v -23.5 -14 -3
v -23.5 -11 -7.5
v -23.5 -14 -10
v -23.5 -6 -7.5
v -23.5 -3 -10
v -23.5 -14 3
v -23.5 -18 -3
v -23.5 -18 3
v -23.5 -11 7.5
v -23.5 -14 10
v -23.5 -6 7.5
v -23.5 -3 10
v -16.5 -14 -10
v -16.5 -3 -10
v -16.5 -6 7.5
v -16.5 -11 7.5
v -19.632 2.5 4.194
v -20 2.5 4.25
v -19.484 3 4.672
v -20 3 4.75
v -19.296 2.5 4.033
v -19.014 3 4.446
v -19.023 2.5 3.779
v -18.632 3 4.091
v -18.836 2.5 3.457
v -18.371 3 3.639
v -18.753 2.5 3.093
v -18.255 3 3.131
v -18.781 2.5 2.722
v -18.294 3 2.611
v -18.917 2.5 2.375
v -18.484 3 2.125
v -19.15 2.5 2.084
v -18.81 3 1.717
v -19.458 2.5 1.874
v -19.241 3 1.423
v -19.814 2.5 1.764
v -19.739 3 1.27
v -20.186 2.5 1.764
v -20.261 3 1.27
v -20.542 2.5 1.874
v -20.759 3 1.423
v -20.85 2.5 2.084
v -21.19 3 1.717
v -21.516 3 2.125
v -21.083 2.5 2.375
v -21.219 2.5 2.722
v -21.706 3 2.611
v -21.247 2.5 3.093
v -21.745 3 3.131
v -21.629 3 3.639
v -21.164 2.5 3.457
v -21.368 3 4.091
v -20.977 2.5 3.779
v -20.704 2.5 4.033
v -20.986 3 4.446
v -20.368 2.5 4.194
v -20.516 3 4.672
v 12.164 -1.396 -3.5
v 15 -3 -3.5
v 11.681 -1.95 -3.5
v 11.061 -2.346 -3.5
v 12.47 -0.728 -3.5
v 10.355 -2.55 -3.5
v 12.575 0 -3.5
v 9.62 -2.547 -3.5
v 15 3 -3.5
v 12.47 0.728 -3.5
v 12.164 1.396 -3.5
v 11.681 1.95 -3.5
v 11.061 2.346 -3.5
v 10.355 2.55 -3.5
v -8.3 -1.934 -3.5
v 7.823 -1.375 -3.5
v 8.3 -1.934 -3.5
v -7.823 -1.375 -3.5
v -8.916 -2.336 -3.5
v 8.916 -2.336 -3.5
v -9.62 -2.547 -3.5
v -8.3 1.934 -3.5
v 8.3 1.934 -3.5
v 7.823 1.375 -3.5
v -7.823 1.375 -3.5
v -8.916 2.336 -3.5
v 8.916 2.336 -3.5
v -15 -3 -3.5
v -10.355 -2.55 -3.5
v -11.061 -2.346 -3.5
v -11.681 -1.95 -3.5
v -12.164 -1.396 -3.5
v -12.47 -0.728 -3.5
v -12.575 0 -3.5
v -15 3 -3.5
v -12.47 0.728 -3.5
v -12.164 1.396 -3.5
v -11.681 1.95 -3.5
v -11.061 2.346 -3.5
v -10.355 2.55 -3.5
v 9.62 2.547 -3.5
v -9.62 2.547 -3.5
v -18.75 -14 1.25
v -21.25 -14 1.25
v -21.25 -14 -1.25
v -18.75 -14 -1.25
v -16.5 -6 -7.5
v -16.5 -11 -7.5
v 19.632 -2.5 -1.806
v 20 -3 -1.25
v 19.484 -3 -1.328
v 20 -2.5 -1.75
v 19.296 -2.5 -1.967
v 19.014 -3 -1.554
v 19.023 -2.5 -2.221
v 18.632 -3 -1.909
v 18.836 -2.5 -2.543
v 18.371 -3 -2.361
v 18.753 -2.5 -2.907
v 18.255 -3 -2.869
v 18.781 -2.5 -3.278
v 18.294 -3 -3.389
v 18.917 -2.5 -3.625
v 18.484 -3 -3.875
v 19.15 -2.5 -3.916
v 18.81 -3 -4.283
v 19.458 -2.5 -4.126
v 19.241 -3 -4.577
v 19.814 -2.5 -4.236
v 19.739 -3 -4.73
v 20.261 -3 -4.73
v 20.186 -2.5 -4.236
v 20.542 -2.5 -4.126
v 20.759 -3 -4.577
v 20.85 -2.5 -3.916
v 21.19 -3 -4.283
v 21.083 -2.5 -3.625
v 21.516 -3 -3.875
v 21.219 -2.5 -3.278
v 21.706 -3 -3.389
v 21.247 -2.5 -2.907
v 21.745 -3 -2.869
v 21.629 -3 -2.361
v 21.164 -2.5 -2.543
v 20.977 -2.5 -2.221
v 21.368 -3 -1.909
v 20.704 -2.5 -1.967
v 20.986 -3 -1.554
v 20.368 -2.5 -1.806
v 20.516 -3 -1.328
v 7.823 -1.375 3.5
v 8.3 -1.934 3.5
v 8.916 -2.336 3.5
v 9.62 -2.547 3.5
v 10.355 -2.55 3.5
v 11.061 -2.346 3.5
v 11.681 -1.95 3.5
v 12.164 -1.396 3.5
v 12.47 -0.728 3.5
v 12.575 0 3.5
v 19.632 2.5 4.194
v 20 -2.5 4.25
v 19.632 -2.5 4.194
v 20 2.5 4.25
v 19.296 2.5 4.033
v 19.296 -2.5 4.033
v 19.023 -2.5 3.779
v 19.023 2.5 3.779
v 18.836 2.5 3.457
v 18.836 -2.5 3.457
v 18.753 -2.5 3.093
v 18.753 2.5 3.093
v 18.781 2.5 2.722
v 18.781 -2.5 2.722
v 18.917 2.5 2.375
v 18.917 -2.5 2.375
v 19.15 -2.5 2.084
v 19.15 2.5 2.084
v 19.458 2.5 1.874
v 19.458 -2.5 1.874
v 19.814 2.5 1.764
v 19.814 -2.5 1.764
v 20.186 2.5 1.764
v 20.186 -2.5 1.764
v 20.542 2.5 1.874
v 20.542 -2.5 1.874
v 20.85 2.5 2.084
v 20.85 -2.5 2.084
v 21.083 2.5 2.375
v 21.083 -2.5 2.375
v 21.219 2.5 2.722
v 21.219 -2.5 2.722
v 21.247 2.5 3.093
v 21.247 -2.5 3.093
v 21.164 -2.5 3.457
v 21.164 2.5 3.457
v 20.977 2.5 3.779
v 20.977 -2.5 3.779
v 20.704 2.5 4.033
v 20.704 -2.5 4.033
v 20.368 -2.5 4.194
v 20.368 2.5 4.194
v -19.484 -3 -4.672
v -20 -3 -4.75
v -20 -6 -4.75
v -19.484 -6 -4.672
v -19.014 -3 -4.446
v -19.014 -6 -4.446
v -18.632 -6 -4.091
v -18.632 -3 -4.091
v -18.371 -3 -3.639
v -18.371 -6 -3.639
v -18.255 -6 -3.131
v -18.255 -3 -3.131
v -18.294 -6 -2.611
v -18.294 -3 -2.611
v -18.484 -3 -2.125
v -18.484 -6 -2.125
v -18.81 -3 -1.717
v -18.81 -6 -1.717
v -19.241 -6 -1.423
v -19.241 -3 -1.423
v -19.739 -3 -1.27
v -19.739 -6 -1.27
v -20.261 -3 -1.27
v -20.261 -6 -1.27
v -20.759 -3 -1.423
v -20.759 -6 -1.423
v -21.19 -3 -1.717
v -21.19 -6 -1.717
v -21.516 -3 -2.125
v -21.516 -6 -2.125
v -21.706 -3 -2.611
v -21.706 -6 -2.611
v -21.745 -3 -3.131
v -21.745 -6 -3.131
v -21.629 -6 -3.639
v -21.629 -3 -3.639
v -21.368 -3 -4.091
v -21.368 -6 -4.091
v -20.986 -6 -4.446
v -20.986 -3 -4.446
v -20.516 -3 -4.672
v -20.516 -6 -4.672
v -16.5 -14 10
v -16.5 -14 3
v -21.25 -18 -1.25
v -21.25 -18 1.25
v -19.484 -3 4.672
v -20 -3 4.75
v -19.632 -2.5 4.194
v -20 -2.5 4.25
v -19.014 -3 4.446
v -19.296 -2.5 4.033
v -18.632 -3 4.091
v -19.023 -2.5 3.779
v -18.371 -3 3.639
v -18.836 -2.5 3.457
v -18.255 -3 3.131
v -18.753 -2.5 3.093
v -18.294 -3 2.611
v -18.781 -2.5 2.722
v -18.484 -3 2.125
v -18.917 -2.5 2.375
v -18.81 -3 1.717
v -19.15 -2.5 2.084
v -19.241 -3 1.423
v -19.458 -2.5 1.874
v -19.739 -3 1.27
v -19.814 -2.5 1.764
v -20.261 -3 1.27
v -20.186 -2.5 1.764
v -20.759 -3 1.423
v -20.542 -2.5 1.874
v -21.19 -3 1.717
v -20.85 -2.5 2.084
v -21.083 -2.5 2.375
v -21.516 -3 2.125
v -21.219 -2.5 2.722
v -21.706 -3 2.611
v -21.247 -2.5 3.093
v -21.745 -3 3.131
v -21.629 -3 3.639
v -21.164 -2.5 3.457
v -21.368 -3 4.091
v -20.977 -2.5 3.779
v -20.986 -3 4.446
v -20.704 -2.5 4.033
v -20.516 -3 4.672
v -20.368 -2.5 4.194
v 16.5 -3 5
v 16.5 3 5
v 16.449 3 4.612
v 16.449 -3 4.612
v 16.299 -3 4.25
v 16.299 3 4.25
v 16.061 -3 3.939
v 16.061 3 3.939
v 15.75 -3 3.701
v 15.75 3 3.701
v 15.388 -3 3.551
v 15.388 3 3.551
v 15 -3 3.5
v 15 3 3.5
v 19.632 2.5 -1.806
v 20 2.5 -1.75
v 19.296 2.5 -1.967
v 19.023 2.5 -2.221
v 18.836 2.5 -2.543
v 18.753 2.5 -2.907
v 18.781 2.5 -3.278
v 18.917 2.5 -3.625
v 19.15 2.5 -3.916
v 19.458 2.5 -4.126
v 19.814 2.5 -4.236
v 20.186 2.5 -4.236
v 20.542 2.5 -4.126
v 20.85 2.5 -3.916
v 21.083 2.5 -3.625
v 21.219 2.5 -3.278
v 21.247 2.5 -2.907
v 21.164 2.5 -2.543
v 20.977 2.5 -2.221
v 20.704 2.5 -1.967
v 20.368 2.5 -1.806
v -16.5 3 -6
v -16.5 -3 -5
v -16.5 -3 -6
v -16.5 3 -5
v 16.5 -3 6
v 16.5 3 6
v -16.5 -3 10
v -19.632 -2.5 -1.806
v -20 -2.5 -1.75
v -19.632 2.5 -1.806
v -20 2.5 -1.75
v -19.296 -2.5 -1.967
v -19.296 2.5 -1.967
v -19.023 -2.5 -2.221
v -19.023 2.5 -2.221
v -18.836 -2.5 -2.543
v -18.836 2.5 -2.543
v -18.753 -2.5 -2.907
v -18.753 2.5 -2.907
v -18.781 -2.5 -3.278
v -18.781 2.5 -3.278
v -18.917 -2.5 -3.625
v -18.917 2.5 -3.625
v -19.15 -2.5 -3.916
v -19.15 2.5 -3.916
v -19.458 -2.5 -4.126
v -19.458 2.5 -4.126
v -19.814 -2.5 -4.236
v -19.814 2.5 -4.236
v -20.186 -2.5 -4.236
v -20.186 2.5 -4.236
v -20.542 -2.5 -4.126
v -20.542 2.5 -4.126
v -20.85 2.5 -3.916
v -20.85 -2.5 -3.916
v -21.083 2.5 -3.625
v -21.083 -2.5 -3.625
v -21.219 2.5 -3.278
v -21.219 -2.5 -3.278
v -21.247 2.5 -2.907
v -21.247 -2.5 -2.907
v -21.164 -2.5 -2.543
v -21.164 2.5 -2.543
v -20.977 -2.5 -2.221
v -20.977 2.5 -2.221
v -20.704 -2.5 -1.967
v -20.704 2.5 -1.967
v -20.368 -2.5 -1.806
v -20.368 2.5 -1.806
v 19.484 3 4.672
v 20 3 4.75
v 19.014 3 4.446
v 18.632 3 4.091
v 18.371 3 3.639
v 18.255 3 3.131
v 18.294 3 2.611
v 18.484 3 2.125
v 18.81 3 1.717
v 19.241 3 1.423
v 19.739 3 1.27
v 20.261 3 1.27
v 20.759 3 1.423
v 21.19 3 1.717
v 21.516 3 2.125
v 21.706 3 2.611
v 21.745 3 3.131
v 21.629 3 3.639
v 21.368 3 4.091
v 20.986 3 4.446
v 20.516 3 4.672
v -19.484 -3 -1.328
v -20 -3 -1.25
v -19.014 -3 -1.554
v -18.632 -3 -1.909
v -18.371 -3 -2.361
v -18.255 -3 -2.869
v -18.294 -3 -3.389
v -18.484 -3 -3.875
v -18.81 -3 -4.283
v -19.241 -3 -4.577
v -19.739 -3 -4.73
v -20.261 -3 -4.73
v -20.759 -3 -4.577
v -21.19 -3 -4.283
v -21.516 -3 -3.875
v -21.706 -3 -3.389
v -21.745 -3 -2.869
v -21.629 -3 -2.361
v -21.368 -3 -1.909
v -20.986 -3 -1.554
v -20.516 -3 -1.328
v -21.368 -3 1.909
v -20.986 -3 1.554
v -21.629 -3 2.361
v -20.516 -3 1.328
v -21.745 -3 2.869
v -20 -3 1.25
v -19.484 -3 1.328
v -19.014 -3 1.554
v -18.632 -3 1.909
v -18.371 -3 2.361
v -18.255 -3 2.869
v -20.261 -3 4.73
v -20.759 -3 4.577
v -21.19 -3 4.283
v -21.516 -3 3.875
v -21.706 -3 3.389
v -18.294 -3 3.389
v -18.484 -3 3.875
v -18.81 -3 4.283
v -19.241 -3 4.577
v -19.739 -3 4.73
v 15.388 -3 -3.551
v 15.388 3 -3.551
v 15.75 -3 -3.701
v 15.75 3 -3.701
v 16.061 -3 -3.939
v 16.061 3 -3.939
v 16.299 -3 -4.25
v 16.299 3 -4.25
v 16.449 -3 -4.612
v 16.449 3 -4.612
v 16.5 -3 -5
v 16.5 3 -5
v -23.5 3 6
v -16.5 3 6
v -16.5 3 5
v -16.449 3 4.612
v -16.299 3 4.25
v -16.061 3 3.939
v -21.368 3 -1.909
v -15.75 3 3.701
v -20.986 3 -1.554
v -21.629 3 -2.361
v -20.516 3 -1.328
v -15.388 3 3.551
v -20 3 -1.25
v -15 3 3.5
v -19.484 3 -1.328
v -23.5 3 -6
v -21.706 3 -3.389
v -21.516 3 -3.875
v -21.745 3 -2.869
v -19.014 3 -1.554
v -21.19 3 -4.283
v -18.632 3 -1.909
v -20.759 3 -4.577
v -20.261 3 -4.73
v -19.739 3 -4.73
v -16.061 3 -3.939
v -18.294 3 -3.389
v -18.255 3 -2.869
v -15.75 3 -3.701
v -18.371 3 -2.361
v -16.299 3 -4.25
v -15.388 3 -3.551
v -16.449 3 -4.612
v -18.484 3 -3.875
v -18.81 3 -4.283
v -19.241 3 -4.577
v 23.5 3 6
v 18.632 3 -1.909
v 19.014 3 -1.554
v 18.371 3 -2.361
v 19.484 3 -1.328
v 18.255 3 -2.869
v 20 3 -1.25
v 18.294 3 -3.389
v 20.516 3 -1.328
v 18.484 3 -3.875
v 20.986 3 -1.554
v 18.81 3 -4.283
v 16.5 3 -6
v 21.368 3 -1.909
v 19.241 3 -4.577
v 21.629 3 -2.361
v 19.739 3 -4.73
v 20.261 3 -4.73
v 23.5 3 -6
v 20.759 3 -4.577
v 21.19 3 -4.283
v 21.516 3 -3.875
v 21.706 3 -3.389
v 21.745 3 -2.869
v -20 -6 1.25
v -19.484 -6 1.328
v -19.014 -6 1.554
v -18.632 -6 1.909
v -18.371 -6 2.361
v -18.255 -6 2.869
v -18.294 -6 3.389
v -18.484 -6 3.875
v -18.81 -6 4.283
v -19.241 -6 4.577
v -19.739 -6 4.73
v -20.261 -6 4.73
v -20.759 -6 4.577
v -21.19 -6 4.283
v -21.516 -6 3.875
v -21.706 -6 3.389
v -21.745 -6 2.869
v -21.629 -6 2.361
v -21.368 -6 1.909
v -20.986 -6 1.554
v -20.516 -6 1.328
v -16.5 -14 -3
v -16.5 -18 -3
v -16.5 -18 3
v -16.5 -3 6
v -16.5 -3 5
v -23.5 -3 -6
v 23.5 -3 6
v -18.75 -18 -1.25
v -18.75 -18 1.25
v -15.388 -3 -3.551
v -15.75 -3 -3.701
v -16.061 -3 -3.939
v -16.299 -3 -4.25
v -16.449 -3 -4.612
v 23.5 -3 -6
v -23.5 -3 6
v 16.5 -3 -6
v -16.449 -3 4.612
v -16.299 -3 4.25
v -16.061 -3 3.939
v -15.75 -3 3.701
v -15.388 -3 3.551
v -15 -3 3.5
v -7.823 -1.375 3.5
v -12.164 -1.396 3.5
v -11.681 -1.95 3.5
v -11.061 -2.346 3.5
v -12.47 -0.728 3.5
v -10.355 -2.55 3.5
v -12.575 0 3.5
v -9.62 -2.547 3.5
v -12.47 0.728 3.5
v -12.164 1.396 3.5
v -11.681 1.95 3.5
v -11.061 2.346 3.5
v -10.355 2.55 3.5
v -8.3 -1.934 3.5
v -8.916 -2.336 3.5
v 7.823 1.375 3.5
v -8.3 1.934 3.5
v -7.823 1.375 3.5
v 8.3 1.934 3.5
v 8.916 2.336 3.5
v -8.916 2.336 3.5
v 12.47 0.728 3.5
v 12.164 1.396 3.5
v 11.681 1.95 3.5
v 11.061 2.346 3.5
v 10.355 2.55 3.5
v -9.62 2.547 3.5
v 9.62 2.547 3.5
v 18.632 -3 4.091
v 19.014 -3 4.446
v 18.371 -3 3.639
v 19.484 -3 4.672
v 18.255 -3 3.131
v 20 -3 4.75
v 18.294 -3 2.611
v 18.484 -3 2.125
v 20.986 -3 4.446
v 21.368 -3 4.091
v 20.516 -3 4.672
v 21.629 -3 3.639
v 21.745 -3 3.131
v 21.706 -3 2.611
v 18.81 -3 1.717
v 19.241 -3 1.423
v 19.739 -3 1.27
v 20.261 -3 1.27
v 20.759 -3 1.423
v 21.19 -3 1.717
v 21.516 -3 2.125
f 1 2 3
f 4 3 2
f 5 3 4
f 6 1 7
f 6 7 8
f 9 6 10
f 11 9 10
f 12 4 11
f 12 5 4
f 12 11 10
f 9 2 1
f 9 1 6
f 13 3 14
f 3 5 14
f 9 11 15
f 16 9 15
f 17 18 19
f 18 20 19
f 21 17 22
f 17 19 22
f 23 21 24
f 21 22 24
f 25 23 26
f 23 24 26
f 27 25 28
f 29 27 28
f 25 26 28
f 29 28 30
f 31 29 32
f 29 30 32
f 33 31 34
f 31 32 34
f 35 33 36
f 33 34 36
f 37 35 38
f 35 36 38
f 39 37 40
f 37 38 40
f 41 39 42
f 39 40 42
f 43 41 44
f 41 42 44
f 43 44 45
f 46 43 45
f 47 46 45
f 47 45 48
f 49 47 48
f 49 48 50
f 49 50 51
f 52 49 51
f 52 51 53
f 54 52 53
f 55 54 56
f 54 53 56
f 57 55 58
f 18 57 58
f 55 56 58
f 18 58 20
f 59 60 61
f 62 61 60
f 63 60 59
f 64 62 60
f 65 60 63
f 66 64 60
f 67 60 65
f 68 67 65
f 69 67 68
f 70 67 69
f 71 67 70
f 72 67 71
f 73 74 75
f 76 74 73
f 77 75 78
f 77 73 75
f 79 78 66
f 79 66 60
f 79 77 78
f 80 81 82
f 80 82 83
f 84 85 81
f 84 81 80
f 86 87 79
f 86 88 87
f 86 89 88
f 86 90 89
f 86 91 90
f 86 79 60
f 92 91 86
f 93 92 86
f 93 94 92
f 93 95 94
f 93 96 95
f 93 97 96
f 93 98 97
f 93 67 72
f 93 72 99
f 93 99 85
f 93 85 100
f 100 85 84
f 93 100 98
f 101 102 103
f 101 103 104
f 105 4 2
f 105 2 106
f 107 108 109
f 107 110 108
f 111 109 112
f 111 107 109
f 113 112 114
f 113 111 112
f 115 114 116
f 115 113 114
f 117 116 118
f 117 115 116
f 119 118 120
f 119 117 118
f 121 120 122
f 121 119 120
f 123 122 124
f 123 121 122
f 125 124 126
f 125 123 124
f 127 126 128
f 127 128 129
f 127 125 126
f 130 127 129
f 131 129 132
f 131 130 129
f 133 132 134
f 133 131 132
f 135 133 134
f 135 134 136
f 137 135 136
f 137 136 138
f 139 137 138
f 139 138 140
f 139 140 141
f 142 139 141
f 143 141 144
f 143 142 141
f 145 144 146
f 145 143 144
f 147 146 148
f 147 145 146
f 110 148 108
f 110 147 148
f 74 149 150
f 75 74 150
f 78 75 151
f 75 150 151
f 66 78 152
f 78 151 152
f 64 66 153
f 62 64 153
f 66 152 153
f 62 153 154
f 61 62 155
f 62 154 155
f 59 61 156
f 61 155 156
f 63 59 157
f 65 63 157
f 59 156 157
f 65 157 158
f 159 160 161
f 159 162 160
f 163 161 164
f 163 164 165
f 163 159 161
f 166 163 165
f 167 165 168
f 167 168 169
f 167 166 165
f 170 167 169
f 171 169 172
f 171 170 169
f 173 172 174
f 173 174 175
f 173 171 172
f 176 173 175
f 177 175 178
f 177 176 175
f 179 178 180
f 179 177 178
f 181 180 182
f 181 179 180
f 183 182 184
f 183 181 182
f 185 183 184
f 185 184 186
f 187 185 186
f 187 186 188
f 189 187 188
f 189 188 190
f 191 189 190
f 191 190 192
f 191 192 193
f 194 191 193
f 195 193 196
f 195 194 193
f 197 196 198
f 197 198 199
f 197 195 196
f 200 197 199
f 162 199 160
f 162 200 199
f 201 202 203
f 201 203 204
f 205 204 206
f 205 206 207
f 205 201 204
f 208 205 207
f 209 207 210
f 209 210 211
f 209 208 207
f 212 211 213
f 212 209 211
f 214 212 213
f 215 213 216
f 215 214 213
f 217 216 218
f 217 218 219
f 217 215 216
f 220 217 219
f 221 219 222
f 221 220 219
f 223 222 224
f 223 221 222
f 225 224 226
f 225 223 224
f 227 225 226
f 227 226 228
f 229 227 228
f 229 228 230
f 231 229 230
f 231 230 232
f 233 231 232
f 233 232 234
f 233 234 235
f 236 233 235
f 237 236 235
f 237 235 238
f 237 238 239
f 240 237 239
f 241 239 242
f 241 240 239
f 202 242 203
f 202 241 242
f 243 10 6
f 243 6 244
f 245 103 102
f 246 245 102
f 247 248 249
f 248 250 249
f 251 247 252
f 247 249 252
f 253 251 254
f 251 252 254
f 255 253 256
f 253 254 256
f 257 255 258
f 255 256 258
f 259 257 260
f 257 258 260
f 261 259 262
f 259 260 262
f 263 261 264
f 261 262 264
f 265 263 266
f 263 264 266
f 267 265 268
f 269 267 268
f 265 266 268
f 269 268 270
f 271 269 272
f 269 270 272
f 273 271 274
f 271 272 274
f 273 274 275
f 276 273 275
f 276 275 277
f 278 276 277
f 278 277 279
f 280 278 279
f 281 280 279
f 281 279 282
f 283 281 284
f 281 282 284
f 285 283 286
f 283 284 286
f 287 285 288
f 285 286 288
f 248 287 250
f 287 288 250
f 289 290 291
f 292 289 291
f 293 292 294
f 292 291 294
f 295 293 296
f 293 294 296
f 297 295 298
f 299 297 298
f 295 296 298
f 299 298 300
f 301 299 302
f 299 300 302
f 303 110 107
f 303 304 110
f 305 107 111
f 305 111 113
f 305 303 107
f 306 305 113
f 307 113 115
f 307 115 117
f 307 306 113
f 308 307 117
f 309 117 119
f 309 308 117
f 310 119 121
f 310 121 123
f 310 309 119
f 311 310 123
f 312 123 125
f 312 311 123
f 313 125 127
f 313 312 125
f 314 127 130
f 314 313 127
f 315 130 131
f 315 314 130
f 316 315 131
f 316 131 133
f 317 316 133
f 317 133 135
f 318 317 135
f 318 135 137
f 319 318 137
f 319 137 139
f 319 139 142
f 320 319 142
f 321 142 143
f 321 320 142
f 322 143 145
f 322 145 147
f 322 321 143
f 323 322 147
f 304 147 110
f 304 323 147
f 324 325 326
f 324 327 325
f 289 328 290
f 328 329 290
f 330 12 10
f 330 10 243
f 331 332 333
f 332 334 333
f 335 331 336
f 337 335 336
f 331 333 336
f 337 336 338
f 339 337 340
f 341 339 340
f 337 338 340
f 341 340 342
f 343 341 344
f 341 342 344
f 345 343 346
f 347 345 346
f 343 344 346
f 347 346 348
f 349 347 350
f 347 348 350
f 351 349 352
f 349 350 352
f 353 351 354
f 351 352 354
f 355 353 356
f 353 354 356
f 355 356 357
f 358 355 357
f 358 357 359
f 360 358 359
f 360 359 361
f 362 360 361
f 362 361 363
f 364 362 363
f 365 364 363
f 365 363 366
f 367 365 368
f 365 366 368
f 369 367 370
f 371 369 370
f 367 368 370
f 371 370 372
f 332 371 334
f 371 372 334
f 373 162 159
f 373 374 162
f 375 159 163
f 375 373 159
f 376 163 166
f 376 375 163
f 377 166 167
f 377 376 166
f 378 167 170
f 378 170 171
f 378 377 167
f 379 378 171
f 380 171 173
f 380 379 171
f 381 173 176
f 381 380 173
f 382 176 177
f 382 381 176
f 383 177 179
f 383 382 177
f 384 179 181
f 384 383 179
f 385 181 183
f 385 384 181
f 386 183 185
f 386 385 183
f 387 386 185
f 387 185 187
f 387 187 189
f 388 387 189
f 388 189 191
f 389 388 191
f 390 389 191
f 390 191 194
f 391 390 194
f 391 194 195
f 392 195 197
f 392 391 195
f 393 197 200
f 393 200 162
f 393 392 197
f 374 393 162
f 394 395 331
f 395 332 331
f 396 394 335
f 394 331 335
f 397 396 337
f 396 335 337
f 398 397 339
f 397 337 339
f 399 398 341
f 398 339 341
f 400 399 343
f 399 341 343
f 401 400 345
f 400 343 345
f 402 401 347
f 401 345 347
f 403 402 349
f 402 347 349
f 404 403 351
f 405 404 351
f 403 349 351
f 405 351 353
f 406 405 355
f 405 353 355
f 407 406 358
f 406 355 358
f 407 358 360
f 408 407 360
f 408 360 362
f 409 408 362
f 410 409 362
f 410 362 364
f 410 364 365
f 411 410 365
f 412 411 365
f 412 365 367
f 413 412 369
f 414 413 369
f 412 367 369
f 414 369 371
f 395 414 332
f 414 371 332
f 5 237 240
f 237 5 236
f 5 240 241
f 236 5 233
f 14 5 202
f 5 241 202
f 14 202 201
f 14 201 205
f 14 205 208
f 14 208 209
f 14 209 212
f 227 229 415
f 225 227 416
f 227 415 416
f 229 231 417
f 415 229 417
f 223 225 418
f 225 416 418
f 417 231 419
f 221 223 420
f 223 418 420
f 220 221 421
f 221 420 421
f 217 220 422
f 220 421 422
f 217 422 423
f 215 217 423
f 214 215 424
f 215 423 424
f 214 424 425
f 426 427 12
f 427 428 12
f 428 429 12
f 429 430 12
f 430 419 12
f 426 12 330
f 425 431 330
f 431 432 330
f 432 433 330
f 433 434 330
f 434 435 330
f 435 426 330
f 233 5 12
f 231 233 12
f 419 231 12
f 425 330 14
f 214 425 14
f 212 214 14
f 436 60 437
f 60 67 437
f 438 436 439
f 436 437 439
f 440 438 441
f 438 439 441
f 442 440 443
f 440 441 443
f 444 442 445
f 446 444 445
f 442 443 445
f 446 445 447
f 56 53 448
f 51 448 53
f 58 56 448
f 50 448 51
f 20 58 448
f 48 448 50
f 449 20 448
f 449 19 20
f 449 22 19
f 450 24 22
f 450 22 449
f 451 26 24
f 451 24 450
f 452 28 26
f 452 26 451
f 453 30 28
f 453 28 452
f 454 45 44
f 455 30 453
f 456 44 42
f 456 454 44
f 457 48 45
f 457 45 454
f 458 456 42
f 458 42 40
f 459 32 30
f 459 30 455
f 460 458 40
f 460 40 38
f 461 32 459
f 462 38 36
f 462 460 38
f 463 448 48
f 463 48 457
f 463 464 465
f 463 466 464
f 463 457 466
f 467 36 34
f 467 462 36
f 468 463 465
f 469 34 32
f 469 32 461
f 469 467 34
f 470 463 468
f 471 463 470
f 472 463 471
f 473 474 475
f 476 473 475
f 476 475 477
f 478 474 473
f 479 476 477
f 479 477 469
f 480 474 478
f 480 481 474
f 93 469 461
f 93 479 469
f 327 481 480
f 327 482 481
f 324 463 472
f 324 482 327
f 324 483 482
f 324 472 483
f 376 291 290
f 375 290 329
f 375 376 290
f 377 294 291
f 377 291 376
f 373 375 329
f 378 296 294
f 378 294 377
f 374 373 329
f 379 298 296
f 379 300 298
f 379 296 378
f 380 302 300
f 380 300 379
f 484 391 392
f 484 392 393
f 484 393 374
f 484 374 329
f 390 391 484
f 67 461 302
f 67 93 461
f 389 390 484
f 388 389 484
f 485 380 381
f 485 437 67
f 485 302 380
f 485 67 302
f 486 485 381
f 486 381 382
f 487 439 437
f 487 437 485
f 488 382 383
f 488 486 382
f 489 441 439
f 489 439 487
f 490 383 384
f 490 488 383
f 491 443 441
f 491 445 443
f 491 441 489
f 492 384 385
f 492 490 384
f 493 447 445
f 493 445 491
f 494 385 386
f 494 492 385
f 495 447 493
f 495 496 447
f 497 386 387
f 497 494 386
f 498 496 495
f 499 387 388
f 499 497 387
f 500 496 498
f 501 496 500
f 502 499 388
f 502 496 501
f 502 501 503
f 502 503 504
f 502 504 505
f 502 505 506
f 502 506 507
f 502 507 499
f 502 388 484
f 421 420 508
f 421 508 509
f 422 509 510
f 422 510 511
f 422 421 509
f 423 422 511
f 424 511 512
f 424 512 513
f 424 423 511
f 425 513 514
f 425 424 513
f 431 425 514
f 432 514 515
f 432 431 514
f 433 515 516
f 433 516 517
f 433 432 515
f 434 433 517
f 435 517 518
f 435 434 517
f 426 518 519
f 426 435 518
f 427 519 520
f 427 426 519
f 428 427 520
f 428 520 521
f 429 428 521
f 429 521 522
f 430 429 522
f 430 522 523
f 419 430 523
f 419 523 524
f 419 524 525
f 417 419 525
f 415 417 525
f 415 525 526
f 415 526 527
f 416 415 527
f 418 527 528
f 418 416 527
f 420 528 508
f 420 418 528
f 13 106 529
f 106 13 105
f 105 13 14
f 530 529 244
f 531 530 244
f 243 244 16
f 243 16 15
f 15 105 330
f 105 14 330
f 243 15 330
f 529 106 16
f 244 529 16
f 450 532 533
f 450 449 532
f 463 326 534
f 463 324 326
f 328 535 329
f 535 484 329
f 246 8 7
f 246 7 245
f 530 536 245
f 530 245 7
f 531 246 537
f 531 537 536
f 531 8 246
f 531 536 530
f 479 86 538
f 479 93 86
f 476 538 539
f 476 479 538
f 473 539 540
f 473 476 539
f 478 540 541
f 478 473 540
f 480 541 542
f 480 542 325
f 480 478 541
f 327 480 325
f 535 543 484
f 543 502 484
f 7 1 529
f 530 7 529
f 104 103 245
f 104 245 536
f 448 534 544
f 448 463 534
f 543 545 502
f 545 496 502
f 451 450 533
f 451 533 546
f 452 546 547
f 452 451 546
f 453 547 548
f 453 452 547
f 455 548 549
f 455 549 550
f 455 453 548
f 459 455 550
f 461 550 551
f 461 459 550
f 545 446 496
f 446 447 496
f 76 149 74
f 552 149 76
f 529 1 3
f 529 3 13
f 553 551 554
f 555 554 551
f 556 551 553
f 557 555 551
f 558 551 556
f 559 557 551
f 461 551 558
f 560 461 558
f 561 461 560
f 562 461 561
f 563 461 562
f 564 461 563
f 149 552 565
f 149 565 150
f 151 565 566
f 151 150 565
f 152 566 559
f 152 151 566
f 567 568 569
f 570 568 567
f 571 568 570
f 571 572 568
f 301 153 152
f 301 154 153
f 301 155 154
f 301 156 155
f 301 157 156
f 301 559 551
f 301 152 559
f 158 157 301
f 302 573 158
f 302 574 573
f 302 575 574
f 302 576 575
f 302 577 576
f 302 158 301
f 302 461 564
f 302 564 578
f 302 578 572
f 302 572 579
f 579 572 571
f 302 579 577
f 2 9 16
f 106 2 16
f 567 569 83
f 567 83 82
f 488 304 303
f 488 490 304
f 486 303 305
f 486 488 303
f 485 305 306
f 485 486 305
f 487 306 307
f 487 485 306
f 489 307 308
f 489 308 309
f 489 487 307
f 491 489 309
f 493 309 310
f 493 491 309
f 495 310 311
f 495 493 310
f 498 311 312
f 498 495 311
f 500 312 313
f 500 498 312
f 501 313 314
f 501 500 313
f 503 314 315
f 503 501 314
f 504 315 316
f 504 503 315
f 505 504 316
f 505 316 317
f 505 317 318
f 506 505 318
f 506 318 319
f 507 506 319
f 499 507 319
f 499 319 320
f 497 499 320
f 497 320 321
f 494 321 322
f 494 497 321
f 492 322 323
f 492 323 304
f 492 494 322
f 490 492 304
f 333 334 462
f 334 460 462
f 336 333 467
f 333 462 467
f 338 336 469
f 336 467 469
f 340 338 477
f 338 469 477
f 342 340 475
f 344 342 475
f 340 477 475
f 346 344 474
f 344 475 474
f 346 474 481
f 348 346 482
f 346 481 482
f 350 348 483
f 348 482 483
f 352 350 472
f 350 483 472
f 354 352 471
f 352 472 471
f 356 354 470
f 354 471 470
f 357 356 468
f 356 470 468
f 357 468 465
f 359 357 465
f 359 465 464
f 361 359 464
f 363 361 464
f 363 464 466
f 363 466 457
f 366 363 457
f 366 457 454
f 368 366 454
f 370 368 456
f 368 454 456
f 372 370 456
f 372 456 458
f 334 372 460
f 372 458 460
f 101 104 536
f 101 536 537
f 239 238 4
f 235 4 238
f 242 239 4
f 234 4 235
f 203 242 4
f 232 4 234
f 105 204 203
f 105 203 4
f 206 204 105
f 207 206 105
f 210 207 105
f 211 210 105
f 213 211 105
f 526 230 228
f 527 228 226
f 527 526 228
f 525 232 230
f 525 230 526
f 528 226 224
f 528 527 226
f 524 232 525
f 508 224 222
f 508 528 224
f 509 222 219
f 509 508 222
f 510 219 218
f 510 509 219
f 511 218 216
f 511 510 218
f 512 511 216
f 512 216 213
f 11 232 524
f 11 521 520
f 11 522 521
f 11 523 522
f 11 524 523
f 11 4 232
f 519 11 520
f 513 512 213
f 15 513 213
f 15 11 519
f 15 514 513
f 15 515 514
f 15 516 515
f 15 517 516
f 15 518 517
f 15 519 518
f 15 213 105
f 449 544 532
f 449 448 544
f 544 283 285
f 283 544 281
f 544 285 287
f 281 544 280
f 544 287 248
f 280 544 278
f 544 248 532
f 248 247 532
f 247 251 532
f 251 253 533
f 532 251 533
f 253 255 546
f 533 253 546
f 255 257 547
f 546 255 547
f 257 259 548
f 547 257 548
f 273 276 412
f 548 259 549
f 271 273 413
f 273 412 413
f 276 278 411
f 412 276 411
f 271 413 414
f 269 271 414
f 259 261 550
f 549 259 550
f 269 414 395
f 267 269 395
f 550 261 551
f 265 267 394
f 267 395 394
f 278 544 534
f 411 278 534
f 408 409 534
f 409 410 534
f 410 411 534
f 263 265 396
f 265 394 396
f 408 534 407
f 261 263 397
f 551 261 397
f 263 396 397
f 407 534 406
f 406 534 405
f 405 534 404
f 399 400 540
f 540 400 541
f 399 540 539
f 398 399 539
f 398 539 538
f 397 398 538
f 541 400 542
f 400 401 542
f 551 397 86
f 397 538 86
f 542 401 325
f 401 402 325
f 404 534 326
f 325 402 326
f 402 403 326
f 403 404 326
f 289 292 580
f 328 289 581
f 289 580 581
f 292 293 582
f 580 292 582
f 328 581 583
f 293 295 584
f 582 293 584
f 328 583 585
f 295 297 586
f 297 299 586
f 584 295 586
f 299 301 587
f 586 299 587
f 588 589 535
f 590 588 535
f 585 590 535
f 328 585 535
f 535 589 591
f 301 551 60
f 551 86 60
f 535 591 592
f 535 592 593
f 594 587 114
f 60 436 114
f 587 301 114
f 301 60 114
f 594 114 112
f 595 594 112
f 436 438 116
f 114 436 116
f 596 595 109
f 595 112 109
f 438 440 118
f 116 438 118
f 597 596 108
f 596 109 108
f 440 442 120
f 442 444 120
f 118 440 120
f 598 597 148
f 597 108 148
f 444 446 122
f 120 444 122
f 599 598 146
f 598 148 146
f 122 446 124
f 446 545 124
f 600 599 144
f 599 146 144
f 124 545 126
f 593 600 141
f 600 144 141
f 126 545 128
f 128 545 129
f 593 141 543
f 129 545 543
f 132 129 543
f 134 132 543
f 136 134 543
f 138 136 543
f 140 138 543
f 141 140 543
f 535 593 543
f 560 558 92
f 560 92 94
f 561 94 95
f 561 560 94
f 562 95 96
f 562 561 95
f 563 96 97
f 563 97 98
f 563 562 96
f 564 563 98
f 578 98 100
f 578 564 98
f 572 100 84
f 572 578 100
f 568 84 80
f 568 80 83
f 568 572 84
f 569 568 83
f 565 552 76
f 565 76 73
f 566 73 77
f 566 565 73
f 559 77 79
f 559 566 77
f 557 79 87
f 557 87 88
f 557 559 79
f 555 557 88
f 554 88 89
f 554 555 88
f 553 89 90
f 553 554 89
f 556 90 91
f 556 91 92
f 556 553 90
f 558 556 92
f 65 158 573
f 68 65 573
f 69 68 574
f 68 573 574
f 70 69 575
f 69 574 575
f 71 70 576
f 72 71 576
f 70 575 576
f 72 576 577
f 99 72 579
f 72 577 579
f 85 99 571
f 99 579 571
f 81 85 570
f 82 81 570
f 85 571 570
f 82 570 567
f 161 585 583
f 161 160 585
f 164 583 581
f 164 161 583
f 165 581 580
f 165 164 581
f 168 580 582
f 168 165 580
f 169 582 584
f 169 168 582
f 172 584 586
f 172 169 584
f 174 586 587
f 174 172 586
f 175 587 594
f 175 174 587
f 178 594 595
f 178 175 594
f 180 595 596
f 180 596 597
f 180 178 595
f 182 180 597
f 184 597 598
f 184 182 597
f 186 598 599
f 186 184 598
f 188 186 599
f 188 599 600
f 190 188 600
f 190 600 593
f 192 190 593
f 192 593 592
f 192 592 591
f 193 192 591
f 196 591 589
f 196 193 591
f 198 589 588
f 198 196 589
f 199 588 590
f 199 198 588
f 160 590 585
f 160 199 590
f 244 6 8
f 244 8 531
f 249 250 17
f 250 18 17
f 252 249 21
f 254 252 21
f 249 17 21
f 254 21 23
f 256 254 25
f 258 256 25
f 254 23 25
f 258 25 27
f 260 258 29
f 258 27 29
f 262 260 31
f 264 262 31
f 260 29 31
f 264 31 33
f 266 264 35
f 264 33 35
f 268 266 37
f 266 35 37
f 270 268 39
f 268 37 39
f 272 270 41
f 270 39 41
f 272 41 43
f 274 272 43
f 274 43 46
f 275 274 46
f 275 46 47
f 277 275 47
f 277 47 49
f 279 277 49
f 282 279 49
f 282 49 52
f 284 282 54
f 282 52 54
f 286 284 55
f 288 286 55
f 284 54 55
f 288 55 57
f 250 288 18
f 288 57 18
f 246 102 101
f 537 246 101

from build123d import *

# Parameters (mm, degrees)
BOSS_EXTRUDE1_DEPTH        = 3
CUT_EXTRUDE1_DEPTH         = 26.524498036
M3_TAPPED_HOLE1_AT_2_COUNT = 2
M3_TAPPED_HOLE1_AT_2_PITCH = 6
SKETCH8_W                  = 7
SKETCH8_H                  = 20
SKETCH8_R                  = 1.75
BOSS_EXTRUDE3_DEPTH        = 3
SKETCH9_W                  = 7
SKETCH9_H                  = 2.5
BOSS_EXTRUDE4_DEPTH        = 5
SKETCH10_W                 = 7
SKETCH10_H                 = 20
BOSS_EXTRUDE5_DEPTH        = 3
SKETCH11_W                 = 7
SKETCH11_H                 = 6
SKETCH11_W_2               = 2.5
SKETCH11_H_2               = 2.5
BOSS_EXTRUDE6_DEPTH        = 4


with BuildPart() as part:
    # Sketch1 → Boss-Extrude1 (new, symmetric)
    with BuildSketch(Plane(origin=(0, 0, 0), x_dir=(1, 0, 0), z_dir=(0, 1, 0))):
        with BuildLine():
            Line((0, -3.5), (0, 3.5))
            Line((0, 3.5), (15, 3.5))
            ThreePointArc((15, 3.5), (16.060660172, 3.939339828), (16.5, 5))
            Line((16.5, 5), (16.5, 6))
            Line((16.5, 6), (23.5, 6))
            Line((23.5, 6), (23.5, -6))
            Line((23.5, -6), (16.5, -6))
            Line((16.5, -6), (16.5, -5))
            ThreePointArc((16.5, -5), (16.060660172, -3.939339828), (15, -3.5))
            Line((15, -3.5), (0, -3.5))
        make_face()
    extrude(amount=BOSS_EXTRUDE1_DEPTH, both=True)

    # Sketch2 → Cut-Extrude1 (cut, through all)
    with BuildSketch(Plane.XY.offset(3.5)):
        with BuildLine():
            ThreePointArc((7.822845894, 1.375), (7.425, 0), (7.822845894, -1.375))
            Line((7.822845894, -1.375), (10, -1.375))
            Line((10, -1.375), (10, 1.375))
            Line((10, 1.375), (7.822845894, 1.375))
        make_face()
        with BuildLine():
            Line((10, -1.375), (7.822845894, -1.375))
            ThreePointArc((7.822845894, -1.375), (10.715700069, -2.473539652), (12.575, 0))
            ThreePointArc((12.575, 0), (10.715700069, 2.473539652), (7.822845894, 1.375))
            Line((7.822845894, 1.375), (10, 1.375))
            Line((10, 1.375), (10, -1.375))
        make_face()
        with BuildLine():
            Line((0, 1.375), (0, -1.375))
            Line((0, -1.375), (7.822845894, -1.375))
            ThreePointArc((7.822845894, -1.375), (7.425, 0), (7.822845894, 1.375))
            Line((7.822845894, 1.375), (0, 1.375))
        make_face()
    extrude(amount=-CUT_EXTRUDE1_DEPTH, mode=Mode.SUBTRACT)

    # Sketch5 → M3 Tapped Hole1 (revolve, cut)
    with BuildSketch(Plane(origin=(20, 3, -3), x_dir=(0, 0, 1), z_dir=(1, 0, 0))):
        Polygon((0, 0), (0, 6), (1.75, 6), (1.25, 5.5), (1.25, 0.5), (1.75, 0), align=None)
    m3_tapped_hole1 = revolve(axis=Axis((20, 9.35, -3), (0, -1, 0)), mode=Mode.SUBTRACT)

    # M3 Tapped Hole1 at 2: M3 Tapped Hole1 ×2
    with Locations(*[(0, 0, i * M3_TAPPED_HOLE1_AT_2_PITCH) for i in range(1, M3_TAPPED_HOLE1_AT_2_COUNT)]):
        add(m3_tapped_hole1, mode=Mode.SUBTRACT)

    # Mirror1: part across plane


with BuildPart() as part_1:
    add(part.part)
    add(part.part.mirror(Plane(origin=(0, 0, 0), x_dir=(0, 0, 1), z_dir=(1, 0, 0))))


with BuildPart() as body_2:
    # Sketch8 → Boss-Extrude3 (new body)
    with BuildSketch(Plane.XZ.offset(3)):
        with Locations((-20, 0)):
            Rectangle(SKETCH8_W, SKETCH8_H)
        with Locations(Location((-20, -3, 0), (0, 0, 270))):
            Circle(SKETCH8_R, mode=Mode.SUBTRACT)
        with Locations(Location((-20, 3, 0), (0, 0, 270))):
            Circle(SKETCH8_R, mode=Mode.SUBTRACT)
    extrude(amount=BOSS_EXTRUDE3_DEPTH)

    # Sketch9 → Boss-Extrude4 (add)
    with BuildSketch(Plane.XZ.offset(6)):
        with Locations((-20, 8.75)):
            Rectangle(SKETCH9_W, SKETCH9_H)
        with Locations((-20, -8.75)):
            Rectangle(SKETCH9_W, SKETCH9_H)
    extrude(amount=BOSS_EXTRUDE4_DEPTH)

    # Sketch10 → Boss-Extrude5 (add)
    with BuildSketch(Plane.XZ.offset(11)):
        with Locations((-20, 0)):
            Rectangle(SKETCH10_W, SKETCH10_H)
    extrude(amount=BOSS_EXTRUDE5_DEPTH)

    # Sketch11 → Boss-Extrude6 (add)
    with BuildSketch(Plane.XZ.offset(14)):
        with Locations((-20, 0)):
            Rectangle(SKETCH11_W, SKETCH11_H)
        with Locations((-20, 0)):
            Rectangle(SKETCH11_W_2, SKETCH11_H_2, mode=Mode.SUBTRACT)
    extrude(amount=BOSS_EXTRUDE6_DEPTH)


solid = Compound([part_1.part, body_2.part])
